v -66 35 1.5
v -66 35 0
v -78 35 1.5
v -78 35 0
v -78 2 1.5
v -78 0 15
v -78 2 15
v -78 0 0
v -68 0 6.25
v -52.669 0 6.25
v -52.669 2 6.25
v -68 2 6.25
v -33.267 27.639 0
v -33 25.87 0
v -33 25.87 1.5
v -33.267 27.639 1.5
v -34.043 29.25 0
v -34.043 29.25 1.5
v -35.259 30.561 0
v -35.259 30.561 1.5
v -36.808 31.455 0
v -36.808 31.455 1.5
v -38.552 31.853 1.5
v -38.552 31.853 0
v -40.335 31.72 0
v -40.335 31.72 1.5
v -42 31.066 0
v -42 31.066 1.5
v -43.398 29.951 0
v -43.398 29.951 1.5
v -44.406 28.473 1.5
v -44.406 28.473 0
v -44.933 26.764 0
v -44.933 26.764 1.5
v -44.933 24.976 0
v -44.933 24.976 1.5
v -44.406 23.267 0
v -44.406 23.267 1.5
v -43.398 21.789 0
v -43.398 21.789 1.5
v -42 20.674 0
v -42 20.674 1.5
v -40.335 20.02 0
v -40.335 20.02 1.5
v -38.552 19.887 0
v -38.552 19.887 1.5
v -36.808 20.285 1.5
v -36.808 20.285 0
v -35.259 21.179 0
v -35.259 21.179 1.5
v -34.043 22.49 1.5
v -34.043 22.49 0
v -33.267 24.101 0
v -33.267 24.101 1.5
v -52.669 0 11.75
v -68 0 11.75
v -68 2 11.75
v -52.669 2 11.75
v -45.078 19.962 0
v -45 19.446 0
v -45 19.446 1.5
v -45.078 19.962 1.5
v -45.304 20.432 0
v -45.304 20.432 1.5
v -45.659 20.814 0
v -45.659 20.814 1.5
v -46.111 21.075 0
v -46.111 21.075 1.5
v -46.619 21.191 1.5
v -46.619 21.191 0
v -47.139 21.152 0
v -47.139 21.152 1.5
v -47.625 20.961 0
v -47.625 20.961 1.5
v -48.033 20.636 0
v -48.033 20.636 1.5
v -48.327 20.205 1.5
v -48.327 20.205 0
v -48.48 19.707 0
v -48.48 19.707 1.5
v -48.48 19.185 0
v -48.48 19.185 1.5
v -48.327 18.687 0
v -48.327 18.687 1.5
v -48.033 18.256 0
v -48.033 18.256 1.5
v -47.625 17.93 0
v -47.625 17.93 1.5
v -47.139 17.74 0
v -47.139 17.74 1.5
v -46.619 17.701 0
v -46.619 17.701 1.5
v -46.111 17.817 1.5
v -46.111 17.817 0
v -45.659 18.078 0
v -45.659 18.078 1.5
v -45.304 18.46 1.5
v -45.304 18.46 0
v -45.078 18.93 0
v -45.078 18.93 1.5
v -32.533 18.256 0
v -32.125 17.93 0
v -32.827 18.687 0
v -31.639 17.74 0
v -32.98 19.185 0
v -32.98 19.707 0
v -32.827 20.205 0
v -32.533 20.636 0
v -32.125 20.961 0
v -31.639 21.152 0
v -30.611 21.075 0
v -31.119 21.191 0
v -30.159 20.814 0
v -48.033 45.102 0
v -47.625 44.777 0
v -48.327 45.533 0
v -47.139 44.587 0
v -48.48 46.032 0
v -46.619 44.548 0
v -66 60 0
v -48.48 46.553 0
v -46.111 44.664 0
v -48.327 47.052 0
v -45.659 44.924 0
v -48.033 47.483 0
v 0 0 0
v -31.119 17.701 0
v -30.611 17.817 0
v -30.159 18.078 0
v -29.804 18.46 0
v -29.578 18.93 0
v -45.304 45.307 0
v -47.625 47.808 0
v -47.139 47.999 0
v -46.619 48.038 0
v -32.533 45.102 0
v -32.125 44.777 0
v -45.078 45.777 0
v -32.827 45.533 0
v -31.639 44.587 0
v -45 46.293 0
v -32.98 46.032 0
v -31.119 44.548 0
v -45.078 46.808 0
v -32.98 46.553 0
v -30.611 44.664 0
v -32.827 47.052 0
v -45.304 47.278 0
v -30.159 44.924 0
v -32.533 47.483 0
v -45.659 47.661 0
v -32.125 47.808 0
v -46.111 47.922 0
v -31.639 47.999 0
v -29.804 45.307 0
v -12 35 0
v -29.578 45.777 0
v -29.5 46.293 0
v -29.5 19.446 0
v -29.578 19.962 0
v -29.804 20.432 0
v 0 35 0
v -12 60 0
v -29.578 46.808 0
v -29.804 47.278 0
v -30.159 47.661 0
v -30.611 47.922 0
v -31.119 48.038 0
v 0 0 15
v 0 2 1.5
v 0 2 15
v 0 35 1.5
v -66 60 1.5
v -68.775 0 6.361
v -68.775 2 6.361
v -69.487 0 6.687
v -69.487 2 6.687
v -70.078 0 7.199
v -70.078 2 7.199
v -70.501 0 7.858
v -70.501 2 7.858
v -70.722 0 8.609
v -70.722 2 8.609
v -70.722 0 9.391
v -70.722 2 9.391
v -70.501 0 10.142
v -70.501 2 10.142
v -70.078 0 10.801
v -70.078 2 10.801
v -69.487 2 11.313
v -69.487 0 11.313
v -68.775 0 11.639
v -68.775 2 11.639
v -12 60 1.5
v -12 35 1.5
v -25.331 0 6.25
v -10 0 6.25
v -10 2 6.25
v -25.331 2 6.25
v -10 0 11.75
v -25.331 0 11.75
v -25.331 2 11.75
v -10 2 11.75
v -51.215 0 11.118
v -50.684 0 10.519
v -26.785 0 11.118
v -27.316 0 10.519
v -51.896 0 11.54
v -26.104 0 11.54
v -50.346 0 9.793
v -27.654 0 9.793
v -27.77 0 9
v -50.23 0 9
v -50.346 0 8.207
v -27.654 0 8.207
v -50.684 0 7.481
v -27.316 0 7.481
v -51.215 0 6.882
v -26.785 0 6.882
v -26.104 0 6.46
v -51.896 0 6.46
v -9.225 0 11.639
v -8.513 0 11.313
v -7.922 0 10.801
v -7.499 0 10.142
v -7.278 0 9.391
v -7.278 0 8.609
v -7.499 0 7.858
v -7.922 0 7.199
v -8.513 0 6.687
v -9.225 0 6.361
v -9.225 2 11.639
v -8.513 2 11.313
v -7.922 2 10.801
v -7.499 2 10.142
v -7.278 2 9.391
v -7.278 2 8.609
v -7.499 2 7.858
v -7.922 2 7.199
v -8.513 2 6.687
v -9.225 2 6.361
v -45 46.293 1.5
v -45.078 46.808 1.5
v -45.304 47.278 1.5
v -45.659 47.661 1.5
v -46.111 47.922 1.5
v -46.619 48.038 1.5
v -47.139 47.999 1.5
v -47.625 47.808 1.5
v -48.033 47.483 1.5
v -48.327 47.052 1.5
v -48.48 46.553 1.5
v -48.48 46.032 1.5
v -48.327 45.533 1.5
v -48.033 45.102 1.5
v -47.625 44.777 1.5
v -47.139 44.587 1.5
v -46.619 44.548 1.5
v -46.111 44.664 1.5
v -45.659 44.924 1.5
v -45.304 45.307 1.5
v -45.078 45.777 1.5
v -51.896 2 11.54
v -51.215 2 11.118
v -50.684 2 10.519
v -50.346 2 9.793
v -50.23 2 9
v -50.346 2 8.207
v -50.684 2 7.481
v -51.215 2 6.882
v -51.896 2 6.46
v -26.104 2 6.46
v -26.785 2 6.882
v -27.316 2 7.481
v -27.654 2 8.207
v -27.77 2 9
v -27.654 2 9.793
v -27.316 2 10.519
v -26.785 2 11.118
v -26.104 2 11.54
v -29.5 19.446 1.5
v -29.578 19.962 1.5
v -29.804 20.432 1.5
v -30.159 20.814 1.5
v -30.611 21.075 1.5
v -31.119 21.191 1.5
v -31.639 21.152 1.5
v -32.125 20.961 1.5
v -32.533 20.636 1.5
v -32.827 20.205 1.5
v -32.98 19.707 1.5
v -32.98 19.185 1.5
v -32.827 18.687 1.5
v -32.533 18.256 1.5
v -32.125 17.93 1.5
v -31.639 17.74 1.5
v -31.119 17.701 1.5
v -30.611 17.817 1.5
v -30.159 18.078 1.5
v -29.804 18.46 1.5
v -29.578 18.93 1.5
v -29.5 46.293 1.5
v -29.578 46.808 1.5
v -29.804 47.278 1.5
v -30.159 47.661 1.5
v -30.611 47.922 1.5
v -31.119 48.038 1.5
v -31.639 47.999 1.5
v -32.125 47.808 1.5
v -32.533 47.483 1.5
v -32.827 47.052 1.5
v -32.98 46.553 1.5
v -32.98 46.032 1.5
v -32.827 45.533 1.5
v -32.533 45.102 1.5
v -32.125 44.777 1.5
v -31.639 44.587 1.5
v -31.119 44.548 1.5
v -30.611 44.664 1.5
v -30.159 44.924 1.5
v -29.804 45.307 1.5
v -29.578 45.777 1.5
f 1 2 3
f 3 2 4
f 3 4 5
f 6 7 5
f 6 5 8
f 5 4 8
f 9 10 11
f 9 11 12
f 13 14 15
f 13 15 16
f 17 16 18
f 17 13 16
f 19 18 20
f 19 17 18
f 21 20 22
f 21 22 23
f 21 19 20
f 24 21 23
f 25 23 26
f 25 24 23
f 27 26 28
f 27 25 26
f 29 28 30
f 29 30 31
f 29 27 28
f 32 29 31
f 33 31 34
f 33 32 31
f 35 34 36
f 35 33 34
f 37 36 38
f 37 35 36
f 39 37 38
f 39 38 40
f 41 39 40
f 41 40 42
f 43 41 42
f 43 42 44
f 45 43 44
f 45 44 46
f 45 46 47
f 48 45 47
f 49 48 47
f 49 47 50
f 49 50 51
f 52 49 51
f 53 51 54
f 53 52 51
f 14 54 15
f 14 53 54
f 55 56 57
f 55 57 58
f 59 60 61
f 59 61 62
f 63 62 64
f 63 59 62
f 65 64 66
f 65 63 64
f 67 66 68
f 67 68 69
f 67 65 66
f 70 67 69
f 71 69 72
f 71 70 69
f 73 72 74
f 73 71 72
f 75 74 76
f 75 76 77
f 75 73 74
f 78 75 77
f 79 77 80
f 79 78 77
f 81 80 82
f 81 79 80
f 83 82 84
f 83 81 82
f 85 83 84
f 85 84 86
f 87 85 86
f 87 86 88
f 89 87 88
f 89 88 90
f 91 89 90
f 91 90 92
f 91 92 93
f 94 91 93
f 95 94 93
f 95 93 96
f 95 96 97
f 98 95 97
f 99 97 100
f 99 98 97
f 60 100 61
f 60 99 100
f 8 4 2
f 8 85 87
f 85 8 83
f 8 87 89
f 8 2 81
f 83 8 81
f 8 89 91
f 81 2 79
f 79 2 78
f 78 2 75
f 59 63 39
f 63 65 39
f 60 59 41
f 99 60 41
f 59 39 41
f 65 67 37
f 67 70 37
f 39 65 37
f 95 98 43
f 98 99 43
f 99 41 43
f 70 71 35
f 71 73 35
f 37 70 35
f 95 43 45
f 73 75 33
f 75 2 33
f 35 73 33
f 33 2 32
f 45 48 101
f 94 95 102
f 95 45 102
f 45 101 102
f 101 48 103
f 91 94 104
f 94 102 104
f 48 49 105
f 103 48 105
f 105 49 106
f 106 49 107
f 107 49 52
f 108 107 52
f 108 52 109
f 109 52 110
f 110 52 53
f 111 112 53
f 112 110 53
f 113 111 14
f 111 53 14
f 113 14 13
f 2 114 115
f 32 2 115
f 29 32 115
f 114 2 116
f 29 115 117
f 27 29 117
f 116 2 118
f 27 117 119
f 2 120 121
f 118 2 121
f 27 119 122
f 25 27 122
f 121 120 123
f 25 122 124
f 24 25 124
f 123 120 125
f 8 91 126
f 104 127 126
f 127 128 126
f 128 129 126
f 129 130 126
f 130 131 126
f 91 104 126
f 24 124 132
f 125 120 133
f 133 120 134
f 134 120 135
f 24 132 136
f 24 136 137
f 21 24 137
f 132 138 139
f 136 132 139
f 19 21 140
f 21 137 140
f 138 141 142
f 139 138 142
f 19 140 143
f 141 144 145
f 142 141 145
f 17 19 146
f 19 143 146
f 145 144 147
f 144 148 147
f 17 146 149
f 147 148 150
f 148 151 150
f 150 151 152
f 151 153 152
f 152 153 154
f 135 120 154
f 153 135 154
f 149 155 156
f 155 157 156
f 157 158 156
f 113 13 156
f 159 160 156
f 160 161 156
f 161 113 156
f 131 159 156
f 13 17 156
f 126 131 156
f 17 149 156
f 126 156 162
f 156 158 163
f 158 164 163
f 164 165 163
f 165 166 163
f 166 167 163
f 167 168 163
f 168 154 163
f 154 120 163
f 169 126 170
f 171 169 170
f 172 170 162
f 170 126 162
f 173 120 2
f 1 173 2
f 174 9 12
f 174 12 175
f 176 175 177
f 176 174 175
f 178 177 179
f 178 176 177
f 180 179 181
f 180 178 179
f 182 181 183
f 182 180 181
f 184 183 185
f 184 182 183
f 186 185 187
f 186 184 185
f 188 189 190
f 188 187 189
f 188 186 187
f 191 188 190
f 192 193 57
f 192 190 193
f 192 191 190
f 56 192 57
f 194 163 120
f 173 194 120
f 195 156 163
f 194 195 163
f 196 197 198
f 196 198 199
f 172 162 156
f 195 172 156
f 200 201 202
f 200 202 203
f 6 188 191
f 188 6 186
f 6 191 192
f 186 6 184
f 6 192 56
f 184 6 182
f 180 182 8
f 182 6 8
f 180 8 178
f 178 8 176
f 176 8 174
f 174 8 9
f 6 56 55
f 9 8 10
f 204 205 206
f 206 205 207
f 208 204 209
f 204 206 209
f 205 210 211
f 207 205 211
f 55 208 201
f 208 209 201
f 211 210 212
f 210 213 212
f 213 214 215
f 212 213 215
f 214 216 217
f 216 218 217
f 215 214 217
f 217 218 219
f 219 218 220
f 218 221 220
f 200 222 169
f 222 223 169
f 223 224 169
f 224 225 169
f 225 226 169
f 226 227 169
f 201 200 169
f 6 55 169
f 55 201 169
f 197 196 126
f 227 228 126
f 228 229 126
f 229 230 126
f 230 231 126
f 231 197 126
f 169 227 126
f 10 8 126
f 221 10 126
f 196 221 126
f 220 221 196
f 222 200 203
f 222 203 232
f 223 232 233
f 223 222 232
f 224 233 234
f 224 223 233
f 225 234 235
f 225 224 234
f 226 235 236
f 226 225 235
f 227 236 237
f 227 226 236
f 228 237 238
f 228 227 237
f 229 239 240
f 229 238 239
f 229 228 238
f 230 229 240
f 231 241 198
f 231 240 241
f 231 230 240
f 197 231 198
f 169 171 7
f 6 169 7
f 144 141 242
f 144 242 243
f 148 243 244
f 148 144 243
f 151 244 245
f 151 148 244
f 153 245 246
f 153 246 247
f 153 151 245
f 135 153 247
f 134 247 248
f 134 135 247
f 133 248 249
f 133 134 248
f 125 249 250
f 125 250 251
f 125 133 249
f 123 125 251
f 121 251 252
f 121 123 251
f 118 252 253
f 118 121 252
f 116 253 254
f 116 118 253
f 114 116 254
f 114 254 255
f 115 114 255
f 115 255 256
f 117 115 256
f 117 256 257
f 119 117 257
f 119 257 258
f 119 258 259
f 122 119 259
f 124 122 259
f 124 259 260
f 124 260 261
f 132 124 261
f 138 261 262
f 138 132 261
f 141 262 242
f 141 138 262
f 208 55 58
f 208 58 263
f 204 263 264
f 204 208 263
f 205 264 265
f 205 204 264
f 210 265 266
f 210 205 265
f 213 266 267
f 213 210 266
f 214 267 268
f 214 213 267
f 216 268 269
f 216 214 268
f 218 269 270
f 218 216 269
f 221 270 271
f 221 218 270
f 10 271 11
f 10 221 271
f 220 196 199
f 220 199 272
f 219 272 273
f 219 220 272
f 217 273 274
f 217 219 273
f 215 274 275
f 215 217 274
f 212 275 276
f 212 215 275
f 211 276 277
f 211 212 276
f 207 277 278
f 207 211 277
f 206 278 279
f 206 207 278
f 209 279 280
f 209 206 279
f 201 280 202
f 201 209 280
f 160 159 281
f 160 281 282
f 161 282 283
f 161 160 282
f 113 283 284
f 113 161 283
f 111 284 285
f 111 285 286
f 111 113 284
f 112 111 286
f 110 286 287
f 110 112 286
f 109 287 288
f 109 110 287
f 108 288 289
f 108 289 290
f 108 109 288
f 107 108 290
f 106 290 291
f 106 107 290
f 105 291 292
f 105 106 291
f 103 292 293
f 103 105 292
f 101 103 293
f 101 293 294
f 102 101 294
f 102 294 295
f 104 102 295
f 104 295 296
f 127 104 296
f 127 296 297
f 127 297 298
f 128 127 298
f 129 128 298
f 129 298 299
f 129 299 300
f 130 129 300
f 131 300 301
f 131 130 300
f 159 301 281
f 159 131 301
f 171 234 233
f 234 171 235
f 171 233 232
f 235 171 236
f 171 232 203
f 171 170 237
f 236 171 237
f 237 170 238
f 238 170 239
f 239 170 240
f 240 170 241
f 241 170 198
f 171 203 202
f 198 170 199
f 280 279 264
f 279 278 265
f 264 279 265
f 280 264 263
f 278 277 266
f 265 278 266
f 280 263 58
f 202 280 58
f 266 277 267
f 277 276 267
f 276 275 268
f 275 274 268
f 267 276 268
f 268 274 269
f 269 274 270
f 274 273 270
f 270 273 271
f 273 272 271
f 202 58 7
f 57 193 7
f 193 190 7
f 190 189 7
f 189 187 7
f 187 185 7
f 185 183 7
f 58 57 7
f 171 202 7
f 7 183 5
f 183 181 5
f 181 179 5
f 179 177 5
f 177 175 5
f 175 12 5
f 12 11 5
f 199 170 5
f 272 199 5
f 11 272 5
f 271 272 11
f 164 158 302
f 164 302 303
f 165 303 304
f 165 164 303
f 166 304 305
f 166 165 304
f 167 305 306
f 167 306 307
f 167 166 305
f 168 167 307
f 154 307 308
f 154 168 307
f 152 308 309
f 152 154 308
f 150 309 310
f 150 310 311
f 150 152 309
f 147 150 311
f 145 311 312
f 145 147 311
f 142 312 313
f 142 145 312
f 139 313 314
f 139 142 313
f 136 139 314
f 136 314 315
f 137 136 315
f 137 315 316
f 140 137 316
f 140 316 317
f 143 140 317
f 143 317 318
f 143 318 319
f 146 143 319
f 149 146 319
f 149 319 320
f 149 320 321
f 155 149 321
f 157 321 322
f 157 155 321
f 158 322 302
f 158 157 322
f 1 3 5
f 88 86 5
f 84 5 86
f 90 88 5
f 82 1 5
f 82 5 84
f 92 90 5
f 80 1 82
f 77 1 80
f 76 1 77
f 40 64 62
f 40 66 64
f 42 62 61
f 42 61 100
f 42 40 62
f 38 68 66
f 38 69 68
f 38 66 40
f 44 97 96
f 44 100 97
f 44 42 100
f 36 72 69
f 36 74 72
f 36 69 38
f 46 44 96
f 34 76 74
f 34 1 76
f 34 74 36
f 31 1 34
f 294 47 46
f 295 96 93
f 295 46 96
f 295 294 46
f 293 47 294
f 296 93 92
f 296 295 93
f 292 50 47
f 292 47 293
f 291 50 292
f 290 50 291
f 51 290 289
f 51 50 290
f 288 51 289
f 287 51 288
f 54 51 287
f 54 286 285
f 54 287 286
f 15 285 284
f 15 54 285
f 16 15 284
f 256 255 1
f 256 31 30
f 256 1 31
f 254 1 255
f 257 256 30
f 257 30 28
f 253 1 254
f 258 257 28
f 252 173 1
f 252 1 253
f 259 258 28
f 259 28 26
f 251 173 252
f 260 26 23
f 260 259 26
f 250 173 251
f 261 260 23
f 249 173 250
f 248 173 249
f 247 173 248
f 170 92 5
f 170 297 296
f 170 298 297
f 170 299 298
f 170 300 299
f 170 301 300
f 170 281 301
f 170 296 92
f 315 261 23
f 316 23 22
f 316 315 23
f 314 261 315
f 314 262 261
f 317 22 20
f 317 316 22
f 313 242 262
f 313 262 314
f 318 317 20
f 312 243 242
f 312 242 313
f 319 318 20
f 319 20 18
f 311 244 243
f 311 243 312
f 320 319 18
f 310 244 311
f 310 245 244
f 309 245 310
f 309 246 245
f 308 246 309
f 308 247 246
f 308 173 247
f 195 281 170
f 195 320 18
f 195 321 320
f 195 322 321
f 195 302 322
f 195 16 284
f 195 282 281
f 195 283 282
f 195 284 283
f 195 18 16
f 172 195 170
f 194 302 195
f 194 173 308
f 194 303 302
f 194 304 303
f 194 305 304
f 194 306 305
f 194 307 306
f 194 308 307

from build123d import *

# Parameters (mm, degrees)
SKETCH_1_R          = 6
SKETCH_1_R_2        = 1.75
EXTRUDE_1_DEPTH     = 1.5
SKETCH_2_W          = 78
SKETCH_2_H          = 2
EXTRUDE_2_DEPTH     = 15
CUT_EXTRUDE_1_DEPTH = 15


with BuildPart() as part:
    # 草图1 → 凸台-拉伸1 (new body)
    with BuildSketch(Plane.XY):
        Polygon((-78, 0), (0, 0), (0, 2), (0, 2.7366), (0, 35), (-12, 35), (-12, 60), (-66, 60), (-66, 35), (-78, 35), (-78, 2.7366), (-78, 2), align=None)
        with Locations((-39, 25.87)):
            Circle(SKETCH_1_R, mode=Mode.SUBTRACT)
        with Locations((-31.25, 19.445882155)):
            Circle(SKETCH_1_R_2, mode=Mode.SUBTRACT)
        with Locations((-46.75, 19.445882155)):
            Circle(SKETCH_1_R_2, mode=Mode.SUBTRACT)
        with Locations((-46.75, 46.292669673)):
            Circle(SKETCH_1_R_2, mode=Mode.SUBTRACT)
        with Locations((-31.25, 46.292669673)):
            Circle(SKETCH_1_R_2, mode=Mode.SUBTRACT)
    extrude(amount=EXTRUDE_1_DEPTH)

    # 草图2 → 凸台-拉伸2 (add)
    with BuildSketch(Plane(origin=(0, 0, 0), x_dir=(-1, 0, 0), z_dir=(0, 0, -1))):
        with Locations((39, 1)):
            Rectangle(SKETCH_2_W, SKETCH_2_H)
    extrude(amount=-EXTRUDE_2_DEPTH)

    # 草图3 → 切除-拉伸1 (cut)
    with BuildSketch(Plane.XZ):
        with BuildLine():
            Line((-68, 11.75), (-52.668833305, 11.75))
            ThreePointArc((-52.668833305, 11.75), (-50.230131523, 9), (-52.668833305, 6.25))
            Line((-52.668833305, 6.25), (-68, 6.25))
            ThreePointArc((-68, 6.25), (-70.75, 9), (-68, 11.75))
        make_face()
        with BuildLine():
            Line((-10, 6.25), (-25.331166695, 6.25))
            ThreePointArc((-25.331166695, 6.25), (-27.769868477, 9), (-25.331166695, 11.75))
            Line((-25.331166695, 11.75), (-10, 11.75))
            ThreePointArc((-10, 11.75), (-7.25, 9), (-10, 6.25))
        make_face()
    extrude(amount=-CUT_EXTRUDE_1_DEPTH, mode=Mode.SUBTRACT)


solid = part.part
